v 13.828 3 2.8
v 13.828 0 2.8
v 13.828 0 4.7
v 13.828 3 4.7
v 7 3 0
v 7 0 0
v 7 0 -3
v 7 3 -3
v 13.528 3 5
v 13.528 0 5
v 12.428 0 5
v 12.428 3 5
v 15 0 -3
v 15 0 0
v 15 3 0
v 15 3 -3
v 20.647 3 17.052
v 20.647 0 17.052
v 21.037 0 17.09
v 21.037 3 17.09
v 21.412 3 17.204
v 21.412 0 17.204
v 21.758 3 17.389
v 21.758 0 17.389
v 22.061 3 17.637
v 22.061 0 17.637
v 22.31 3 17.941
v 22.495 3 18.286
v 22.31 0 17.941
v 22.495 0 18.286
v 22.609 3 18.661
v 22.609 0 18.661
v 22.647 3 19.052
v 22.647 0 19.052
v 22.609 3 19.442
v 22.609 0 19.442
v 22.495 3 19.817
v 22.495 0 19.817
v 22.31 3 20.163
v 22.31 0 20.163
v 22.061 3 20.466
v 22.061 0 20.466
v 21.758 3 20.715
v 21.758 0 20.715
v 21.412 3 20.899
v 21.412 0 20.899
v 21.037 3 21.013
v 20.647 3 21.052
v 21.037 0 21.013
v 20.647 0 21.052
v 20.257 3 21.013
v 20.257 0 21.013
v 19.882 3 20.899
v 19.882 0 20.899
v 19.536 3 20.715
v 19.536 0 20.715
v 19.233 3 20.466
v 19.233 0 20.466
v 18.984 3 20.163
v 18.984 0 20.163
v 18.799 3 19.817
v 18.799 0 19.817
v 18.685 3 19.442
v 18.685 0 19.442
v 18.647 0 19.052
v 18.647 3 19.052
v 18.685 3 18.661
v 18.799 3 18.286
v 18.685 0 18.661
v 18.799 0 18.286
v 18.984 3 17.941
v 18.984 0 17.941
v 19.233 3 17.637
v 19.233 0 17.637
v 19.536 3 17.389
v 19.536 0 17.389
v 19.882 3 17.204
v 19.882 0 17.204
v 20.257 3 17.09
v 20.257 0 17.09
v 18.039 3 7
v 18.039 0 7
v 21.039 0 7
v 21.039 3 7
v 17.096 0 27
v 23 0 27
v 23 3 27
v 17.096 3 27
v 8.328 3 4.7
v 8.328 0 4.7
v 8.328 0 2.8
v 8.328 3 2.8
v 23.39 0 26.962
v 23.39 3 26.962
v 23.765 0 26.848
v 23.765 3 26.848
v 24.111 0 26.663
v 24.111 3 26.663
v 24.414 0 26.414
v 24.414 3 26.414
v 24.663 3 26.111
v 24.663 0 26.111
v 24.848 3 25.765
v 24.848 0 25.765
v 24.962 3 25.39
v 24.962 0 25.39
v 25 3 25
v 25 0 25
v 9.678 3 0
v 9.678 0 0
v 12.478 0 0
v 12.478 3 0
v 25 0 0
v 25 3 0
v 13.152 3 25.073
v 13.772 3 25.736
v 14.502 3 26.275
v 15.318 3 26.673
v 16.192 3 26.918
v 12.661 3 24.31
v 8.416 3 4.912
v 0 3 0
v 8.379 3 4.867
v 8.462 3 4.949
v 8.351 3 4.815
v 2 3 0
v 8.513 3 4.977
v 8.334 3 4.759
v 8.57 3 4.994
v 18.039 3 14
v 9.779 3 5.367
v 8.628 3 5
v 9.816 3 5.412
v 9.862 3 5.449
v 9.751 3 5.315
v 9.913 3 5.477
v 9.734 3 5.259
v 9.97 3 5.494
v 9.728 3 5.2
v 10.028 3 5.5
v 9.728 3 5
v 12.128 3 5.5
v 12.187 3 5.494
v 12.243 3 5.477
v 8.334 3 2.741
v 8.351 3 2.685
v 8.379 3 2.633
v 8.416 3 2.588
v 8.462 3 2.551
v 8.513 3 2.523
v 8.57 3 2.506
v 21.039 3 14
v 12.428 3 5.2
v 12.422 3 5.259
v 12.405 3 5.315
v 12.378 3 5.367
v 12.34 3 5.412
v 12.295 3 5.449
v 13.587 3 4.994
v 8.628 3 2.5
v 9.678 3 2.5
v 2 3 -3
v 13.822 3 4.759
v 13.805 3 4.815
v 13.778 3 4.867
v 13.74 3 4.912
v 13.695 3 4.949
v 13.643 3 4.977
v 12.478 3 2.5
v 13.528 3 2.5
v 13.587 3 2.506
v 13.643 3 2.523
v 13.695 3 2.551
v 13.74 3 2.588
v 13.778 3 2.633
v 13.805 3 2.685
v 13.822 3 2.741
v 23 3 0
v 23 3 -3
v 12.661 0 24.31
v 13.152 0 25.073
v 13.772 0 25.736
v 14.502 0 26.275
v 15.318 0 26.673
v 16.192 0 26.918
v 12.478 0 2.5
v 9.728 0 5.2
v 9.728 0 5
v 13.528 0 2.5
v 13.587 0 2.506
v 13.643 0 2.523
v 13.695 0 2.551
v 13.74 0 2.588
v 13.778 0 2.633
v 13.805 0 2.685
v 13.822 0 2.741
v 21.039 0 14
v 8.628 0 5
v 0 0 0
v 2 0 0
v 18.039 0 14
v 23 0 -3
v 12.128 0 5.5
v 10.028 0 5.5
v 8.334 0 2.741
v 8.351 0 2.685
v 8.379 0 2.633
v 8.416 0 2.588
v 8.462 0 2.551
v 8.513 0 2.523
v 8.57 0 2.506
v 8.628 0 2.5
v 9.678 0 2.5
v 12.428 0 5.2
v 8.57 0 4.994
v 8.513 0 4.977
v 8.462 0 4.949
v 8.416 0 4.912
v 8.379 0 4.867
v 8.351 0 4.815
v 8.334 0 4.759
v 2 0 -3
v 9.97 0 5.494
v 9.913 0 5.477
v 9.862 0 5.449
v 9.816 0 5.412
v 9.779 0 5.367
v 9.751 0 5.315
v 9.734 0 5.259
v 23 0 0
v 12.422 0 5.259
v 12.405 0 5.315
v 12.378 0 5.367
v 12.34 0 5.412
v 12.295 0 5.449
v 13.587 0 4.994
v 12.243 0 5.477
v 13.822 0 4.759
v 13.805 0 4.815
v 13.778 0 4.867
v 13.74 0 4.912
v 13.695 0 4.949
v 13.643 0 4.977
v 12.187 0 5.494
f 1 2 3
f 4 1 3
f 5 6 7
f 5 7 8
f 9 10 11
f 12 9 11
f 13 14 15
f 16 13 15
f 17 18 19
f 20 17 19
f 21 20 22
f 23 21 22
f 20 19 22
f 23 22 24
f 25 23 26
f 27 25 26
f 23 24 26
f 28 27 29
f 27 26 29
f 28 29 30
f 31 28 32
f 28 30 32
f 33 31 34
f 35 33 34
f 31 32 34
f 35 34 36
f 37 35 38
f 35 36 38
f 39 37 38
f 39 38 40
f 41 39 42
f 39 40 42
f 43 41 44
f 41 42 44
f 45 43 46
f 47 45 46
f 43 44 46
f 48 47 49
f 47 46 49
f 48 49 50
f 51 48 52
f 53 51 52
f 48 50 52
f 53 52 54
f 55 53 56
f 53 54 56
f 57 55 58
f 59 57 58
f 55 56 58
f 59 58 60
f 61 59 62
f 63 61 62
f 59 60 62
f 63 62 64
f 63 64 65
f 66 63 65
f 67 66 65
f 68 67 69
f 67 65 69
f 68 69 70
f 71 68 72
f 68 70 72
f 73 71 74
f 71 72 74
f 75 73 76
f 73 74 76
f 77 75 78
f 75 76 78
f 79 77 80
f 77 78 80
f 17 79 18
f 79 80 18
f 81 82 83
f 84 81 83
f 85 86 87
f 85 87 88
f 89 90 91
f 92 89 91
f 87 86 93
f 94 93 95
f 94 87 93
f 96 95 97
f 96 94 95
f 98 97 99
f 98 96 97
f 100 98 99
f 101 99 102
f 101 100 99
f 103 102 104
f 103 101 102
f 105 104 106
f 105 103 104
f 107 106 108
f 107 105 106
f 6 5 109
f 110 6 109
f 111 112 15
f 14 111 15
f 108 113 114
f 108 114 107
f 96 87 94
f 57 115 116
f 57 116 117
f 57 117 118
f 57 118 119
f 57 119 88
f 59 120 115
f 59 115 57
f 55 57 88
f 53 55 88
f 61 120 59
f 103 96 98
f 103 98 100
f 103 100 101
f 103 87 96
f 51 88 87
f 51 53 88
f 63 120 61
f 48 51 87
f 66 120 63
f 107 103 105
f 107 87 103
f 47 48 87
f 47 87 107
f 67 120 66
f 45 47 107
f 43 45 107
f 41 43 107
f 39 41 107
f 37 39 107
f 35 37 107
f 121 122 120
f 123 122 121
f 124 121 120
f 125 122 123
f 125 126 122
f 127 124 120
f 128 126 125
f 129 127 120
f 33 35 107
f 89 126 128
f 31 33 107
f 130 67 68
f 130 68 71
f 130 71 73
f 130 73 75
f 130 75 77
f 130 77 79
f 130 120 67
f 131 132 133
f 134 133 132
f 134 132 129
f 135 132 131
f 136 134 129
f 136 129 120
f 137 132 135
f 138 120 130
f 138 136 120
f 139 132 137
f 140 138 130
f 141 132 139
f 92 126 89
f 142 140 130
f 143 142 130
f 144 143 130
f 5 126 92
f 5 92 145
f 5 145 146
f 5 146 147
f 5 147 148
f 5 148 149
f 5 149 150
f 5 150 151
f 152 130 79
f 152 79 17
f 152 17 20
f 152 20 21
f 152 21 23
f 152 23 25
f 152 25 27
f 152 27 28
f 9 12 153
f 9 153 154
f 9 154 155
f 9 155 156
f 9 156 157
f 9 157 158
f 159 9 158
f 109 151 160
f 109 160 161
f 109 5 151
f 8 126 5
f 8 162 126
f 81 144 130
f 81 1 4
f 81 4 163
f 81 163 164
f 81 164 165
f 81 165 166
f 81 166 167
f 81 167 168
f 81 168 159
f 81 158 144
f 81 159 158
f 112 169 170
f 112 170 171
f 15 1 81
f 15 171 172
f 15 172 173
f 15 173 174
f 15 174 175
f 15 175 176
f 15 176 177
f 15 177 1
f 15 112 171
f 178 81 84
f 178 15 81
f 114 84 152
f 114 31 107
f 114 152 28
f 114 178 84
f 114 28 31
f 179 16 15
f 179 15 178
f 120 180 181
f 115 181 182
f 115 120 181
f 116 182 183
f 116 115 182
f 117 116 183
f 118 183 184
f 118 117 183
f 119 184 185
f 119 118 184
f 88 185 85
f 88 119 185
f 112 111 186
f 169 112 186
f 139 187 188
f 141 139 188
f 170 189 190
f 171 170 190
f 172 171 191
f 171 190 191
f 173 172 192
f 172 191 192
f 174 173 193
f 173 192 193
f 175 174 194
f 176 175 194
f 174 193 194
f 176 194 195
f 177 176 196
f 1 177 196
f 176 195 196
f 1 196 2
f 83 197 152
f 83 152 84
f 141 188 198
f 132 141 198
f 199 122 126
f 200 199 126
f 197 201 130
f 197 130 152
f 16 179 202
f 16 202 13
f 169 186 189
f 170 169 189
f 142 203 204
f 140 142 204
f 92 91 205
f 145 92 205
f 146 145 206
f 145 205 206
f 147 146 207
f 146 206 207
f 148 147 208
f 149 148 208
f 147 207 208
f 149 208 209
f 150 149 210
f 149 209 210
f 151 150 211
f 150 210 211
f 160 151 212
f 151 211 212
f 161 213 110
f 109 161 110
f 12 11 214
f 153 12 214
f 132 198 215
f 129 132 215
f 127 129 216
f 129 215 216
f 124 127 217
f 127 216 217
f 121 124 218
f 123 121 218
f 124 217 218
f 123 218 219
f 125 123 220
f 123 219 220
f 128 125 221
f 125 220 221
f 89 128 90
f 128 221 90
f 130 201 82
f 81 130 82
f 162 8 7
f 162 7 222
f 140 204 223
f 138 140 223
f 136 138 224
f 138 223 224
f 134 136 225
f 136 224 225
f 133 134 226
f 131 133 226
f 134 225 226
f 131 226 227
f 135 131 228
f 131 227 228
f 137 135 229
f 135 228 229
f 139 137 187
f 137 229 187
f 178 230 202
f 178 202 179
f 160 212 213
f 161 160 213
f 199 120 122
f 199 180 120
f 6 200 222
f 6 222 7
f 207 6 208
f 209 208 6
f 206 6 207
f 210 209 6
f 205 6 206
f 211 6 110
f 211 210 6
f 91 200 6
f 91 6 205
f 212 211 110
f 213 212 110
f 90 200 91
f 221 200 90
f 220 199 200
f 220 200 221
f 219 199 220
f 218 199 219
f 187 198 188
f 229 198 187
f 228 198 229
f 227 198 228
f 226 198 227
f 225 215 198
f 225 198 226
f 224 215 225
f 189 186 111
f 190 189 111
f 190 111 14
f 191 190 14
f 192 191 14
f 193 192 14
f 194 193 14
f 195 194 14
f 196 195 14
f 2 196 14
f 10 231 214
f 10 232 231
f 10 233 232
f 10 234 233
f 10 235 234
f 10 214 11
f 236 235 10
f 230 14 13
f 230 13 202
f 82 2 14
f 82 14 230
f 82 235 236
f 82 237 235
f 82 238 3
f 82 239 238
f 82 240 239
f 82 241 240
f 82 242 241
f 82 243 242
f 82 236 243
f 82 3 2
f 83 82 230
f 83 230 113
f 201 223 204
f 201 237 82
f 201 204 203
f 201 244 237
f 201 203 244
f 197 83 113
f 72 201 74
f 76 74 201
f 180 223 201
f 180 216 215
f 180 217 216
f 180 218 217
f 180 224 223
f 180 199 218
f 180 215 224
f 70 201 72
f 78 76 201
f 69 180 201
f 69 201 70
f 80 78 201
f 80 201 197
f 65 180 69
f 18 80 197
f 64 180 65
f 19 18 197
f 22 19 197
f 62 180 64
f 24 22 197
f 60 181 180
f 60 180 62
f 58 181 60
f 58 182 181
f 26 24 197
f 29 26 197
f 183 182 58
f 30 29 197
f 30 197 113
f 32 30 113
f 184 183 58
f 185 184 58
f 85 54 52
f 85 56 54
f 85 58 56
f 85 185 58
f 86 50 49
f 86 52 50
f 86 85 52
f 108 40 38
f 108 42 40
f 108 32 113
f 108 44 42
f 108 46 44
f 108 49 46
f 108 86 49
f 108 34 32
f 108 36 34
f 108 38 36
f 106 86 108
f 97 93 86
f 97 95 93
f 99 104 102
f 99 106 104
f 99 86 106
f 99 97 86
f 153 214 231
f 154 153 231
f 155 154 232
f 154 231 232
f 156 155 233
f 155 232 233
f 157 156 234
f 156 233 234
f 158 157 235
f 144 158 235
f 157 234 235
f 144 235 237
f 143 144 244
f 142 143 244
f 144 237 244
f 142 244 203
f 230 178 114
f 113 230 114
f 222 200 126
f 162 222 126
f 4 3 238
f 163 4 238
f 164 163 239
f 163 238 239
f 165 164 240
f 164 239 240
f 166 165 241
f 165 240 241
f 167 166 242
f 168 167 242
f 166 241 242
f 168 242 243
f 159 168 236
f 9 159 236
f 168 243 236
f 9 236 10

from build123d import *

# Parameters (mm, degrees)
SKETCH_1_W          = 25
SKETCH_1_H          = 5
EXTRUDE_1_DEPTH     = 24
SKETCH_2_W          = 5
SKETCH_2_H          = 5
SKETCH_2_W_2        = 8
EXTRUDE_2_DEPTH     = 3
CUT_EXTRUDE_2_DEPTH = 5
EXTRUDE_3_DEPTH     = 5
FILLET_1_R          = 5
FILLET_2_R          = 2
CUT_EXTRUDE_4_DEPTH = 2
CUT_EXTRUDE_5_DEPTH = 3
SKETCH_9_R          = 2
CUT_EXTRUDE_6_DEPTH = 3
SKETCH_10_W         = 7
SKETCH_10_H         = 3
CUT_EXTRUDE_7_DEPTH = 3


with BuildPart() as part:
    # 草图1 → 凸台-拉伸1 (new body)
    with BuildSketch(Plane.XY):
        with Locations((12.5, 2.5)):
            Rectangle(SKETCH_1_W, SKETCH_1_H)
    extrude(amount=EXTRUDE_1_DEPTH)

    # 草图2 → 凸台-拉伸2 (add)
    with BuildSketch(Plane(origin=(0, 0, 0), x_dir=(-1, 0, 0), z_dir=(0, 0, -1))):
        with Locations((-4.5, 2.5)):
            Rectangle(SKETCH_2_W, SKETCH_2_H)
        with Locations((-19, 2.5)):
            Rectangle(SKETCH_2_W_2, SKETCH_2_H)
    extrude(amount=EXTRUDE_2_DEPTH)

    # 草图3 → 切除-拉伸2 (cut)
    with BuildSketch(Plane.XZ):
        Polygon((12.5, 24), (0, 24), (0, 0), align=None)
    extrude(amount=-CUT_EXTRUDE_2_DEPTH, mode=Mode.SUBTRACT)

    # 草图4 → 凸台-拉伸3 (add)
    with BuildSketch(Plane.XZ):
        Polygon((12.5, 24), (25, 24), (25, 27), (14.0625, 27), align=None)
    extrude(amount=-EXTRUDE_3_DEPTH)

    # 圆角1
    fillet_1_edges = [part.edges().sort_by_distance(p)[0] for p in [
        (14.0625, 2.5, 27),
    ]]
    fillet(fillet_1_edges, radius=FILLET_1_R)

    # 圆角2
    fillet_2_edges = [part.edges().sort_by_distance(p)[0] for p in [
        (25, 2.5, 27),
    ]]
    fillet(fillet_2_edges, radius=FILLET_2_R)

    # 草图7 → 切除-拉伸4 (cut)
    with BuildSketch(Plane(origin=(0, 5, 0), x_dir=(1, 0, 0), z_dir=(0, 1, 0))):
        with BuildLine():
            Line((17.09585797, -27), (23, -27))
            ThreePointArc((23, -27), (24.414213562, -26.414213562), (25, -25))
            Line((25, -25), (25, 0))
            Line((25, 0), (23, 0))
            Line((23, 0), (23, 3))
            Line((23, 3), (15, 3))
            Line((15, 3), (15, 0))
            Line((15, 0), (7, 0))
            Line((7, 0), (7, 3))
            Line((7, 3), (2, 3))
            Line((2, 3), (2, 0))
            Line((2, 0), (0, 0))
            Line((0, 0), (12.661287549, -24.309672094))
            ThreePointArc((12.661287549, -24.309672094), (14.502439422, -26.274831018), (17.09585797, -27))
        make_face()
    extrude(amount=-CUT_EXTRUDE_4_DEPTH, mode=Mode.SUBTRACT)

    # 草图8 → 切除-拉伸5 (cut)
    with BuildSketch(Plane(origin=(38.221211183, 0, -111.620742166), x_dir=(0, 0, -1), z_dir=(0, -1, 0))):
        with BuildLine():
            Line((-114.120742166, -28.543003338), (-111.620742166, -28.543003338))
            Line((-111.620742166, -28.543003338), (-111.620742166, -25.743003338))
            Line((-111.620742166, -25.743003338), (-114.120742166, -25.743003338))
            Line((-114.120742166, -25.743003338), (-114.120742166, -24.693003338))
            ThreePointArc((-114.120742166, -24.693003338), (-114.208610132, -24.480871304), (-114.420742166, -24.393003338))
            Line((-114.420742166, -24.393003338), (-116.320742166, -24.393003338))
            ThreePointArc((-116.320742166, -24.393003338), (-116.5328742, -24.480871304), (-116.620742166, -24.693003338))
            Line((-116.620742166, -24.693003338), (-116.620742166, -25.793003338))
            Line((-116.620742166, -25.793003338), (-116.820742166, -25.793003338))
            ThreePointArc((-116.820742166, -25.793003338), (-117.0328742, -25.880871304), (-117.120742166, -26.093003338))
            Line((-117.120742166, -26.093003338), (-117.120742166, -28.193003338))
            ThreePointArc((-117.120742166, -28.193003338), (-117.0328742, -28.405135373), (-116.820742166, -28.493003338))
            Line((-116.820742166, -28.493003338), (-116.620742166, -28.493003338))
            Line((-116.620742166, -28.493003338), (-116.620742166, -29.593003338))
            ThreePointArc((-116.620742166, -29.593003338), (-116.5328742, -29.805135373), (-116.320742166, -29.893003338))
            Line((-116.320742166, -29.893003338), (-114.420742166, -29.893003338))
            ThreePointArc((-114.420742166, -29.893003338), (-114.208610132, -29.805135373), (-114.120742166, -29.593003338))
            Line((-114.120742166, -29.593003338), (-114.120742166, -28.543003338))
        make_face()
    extrude(amount=-CUT_EXTRUDE_5_DEPTH, mode=Mode.SUBTRACT)

    # 草图9 → 切除-拉伸6 (cut)
    with BuildSketch(Plane(origin=(38.221211183, 0, -111.620742166), x_dir=(0, 0, -1), z_dir=(0, -1, 0))):
        with Locations((-130.672383052, -17.574261788)):
            Circle(SKETCH_9_R)
    extrude(amount=-CUT_EXTRUDE_6_DEPTH, mode=Mode.SUBTRACT)

    # 草图10 → 切除-拉伸7 (cut)
    with BuildSketch(Plane(origin=(38.221211183, 0, -111.620742166), x_dir=(0, 0, -1), z_dir=(0, -1, 0))):
        with Locations((-122.120742166, -18.681849587)):
            Rectangle(SKETCH_10_W, SKETCH_10_H)
    extrude(amount=-CUT_EXTRUDE_7_DEPTH, mode=Mode.SUBTRACT)


solid = part.part
